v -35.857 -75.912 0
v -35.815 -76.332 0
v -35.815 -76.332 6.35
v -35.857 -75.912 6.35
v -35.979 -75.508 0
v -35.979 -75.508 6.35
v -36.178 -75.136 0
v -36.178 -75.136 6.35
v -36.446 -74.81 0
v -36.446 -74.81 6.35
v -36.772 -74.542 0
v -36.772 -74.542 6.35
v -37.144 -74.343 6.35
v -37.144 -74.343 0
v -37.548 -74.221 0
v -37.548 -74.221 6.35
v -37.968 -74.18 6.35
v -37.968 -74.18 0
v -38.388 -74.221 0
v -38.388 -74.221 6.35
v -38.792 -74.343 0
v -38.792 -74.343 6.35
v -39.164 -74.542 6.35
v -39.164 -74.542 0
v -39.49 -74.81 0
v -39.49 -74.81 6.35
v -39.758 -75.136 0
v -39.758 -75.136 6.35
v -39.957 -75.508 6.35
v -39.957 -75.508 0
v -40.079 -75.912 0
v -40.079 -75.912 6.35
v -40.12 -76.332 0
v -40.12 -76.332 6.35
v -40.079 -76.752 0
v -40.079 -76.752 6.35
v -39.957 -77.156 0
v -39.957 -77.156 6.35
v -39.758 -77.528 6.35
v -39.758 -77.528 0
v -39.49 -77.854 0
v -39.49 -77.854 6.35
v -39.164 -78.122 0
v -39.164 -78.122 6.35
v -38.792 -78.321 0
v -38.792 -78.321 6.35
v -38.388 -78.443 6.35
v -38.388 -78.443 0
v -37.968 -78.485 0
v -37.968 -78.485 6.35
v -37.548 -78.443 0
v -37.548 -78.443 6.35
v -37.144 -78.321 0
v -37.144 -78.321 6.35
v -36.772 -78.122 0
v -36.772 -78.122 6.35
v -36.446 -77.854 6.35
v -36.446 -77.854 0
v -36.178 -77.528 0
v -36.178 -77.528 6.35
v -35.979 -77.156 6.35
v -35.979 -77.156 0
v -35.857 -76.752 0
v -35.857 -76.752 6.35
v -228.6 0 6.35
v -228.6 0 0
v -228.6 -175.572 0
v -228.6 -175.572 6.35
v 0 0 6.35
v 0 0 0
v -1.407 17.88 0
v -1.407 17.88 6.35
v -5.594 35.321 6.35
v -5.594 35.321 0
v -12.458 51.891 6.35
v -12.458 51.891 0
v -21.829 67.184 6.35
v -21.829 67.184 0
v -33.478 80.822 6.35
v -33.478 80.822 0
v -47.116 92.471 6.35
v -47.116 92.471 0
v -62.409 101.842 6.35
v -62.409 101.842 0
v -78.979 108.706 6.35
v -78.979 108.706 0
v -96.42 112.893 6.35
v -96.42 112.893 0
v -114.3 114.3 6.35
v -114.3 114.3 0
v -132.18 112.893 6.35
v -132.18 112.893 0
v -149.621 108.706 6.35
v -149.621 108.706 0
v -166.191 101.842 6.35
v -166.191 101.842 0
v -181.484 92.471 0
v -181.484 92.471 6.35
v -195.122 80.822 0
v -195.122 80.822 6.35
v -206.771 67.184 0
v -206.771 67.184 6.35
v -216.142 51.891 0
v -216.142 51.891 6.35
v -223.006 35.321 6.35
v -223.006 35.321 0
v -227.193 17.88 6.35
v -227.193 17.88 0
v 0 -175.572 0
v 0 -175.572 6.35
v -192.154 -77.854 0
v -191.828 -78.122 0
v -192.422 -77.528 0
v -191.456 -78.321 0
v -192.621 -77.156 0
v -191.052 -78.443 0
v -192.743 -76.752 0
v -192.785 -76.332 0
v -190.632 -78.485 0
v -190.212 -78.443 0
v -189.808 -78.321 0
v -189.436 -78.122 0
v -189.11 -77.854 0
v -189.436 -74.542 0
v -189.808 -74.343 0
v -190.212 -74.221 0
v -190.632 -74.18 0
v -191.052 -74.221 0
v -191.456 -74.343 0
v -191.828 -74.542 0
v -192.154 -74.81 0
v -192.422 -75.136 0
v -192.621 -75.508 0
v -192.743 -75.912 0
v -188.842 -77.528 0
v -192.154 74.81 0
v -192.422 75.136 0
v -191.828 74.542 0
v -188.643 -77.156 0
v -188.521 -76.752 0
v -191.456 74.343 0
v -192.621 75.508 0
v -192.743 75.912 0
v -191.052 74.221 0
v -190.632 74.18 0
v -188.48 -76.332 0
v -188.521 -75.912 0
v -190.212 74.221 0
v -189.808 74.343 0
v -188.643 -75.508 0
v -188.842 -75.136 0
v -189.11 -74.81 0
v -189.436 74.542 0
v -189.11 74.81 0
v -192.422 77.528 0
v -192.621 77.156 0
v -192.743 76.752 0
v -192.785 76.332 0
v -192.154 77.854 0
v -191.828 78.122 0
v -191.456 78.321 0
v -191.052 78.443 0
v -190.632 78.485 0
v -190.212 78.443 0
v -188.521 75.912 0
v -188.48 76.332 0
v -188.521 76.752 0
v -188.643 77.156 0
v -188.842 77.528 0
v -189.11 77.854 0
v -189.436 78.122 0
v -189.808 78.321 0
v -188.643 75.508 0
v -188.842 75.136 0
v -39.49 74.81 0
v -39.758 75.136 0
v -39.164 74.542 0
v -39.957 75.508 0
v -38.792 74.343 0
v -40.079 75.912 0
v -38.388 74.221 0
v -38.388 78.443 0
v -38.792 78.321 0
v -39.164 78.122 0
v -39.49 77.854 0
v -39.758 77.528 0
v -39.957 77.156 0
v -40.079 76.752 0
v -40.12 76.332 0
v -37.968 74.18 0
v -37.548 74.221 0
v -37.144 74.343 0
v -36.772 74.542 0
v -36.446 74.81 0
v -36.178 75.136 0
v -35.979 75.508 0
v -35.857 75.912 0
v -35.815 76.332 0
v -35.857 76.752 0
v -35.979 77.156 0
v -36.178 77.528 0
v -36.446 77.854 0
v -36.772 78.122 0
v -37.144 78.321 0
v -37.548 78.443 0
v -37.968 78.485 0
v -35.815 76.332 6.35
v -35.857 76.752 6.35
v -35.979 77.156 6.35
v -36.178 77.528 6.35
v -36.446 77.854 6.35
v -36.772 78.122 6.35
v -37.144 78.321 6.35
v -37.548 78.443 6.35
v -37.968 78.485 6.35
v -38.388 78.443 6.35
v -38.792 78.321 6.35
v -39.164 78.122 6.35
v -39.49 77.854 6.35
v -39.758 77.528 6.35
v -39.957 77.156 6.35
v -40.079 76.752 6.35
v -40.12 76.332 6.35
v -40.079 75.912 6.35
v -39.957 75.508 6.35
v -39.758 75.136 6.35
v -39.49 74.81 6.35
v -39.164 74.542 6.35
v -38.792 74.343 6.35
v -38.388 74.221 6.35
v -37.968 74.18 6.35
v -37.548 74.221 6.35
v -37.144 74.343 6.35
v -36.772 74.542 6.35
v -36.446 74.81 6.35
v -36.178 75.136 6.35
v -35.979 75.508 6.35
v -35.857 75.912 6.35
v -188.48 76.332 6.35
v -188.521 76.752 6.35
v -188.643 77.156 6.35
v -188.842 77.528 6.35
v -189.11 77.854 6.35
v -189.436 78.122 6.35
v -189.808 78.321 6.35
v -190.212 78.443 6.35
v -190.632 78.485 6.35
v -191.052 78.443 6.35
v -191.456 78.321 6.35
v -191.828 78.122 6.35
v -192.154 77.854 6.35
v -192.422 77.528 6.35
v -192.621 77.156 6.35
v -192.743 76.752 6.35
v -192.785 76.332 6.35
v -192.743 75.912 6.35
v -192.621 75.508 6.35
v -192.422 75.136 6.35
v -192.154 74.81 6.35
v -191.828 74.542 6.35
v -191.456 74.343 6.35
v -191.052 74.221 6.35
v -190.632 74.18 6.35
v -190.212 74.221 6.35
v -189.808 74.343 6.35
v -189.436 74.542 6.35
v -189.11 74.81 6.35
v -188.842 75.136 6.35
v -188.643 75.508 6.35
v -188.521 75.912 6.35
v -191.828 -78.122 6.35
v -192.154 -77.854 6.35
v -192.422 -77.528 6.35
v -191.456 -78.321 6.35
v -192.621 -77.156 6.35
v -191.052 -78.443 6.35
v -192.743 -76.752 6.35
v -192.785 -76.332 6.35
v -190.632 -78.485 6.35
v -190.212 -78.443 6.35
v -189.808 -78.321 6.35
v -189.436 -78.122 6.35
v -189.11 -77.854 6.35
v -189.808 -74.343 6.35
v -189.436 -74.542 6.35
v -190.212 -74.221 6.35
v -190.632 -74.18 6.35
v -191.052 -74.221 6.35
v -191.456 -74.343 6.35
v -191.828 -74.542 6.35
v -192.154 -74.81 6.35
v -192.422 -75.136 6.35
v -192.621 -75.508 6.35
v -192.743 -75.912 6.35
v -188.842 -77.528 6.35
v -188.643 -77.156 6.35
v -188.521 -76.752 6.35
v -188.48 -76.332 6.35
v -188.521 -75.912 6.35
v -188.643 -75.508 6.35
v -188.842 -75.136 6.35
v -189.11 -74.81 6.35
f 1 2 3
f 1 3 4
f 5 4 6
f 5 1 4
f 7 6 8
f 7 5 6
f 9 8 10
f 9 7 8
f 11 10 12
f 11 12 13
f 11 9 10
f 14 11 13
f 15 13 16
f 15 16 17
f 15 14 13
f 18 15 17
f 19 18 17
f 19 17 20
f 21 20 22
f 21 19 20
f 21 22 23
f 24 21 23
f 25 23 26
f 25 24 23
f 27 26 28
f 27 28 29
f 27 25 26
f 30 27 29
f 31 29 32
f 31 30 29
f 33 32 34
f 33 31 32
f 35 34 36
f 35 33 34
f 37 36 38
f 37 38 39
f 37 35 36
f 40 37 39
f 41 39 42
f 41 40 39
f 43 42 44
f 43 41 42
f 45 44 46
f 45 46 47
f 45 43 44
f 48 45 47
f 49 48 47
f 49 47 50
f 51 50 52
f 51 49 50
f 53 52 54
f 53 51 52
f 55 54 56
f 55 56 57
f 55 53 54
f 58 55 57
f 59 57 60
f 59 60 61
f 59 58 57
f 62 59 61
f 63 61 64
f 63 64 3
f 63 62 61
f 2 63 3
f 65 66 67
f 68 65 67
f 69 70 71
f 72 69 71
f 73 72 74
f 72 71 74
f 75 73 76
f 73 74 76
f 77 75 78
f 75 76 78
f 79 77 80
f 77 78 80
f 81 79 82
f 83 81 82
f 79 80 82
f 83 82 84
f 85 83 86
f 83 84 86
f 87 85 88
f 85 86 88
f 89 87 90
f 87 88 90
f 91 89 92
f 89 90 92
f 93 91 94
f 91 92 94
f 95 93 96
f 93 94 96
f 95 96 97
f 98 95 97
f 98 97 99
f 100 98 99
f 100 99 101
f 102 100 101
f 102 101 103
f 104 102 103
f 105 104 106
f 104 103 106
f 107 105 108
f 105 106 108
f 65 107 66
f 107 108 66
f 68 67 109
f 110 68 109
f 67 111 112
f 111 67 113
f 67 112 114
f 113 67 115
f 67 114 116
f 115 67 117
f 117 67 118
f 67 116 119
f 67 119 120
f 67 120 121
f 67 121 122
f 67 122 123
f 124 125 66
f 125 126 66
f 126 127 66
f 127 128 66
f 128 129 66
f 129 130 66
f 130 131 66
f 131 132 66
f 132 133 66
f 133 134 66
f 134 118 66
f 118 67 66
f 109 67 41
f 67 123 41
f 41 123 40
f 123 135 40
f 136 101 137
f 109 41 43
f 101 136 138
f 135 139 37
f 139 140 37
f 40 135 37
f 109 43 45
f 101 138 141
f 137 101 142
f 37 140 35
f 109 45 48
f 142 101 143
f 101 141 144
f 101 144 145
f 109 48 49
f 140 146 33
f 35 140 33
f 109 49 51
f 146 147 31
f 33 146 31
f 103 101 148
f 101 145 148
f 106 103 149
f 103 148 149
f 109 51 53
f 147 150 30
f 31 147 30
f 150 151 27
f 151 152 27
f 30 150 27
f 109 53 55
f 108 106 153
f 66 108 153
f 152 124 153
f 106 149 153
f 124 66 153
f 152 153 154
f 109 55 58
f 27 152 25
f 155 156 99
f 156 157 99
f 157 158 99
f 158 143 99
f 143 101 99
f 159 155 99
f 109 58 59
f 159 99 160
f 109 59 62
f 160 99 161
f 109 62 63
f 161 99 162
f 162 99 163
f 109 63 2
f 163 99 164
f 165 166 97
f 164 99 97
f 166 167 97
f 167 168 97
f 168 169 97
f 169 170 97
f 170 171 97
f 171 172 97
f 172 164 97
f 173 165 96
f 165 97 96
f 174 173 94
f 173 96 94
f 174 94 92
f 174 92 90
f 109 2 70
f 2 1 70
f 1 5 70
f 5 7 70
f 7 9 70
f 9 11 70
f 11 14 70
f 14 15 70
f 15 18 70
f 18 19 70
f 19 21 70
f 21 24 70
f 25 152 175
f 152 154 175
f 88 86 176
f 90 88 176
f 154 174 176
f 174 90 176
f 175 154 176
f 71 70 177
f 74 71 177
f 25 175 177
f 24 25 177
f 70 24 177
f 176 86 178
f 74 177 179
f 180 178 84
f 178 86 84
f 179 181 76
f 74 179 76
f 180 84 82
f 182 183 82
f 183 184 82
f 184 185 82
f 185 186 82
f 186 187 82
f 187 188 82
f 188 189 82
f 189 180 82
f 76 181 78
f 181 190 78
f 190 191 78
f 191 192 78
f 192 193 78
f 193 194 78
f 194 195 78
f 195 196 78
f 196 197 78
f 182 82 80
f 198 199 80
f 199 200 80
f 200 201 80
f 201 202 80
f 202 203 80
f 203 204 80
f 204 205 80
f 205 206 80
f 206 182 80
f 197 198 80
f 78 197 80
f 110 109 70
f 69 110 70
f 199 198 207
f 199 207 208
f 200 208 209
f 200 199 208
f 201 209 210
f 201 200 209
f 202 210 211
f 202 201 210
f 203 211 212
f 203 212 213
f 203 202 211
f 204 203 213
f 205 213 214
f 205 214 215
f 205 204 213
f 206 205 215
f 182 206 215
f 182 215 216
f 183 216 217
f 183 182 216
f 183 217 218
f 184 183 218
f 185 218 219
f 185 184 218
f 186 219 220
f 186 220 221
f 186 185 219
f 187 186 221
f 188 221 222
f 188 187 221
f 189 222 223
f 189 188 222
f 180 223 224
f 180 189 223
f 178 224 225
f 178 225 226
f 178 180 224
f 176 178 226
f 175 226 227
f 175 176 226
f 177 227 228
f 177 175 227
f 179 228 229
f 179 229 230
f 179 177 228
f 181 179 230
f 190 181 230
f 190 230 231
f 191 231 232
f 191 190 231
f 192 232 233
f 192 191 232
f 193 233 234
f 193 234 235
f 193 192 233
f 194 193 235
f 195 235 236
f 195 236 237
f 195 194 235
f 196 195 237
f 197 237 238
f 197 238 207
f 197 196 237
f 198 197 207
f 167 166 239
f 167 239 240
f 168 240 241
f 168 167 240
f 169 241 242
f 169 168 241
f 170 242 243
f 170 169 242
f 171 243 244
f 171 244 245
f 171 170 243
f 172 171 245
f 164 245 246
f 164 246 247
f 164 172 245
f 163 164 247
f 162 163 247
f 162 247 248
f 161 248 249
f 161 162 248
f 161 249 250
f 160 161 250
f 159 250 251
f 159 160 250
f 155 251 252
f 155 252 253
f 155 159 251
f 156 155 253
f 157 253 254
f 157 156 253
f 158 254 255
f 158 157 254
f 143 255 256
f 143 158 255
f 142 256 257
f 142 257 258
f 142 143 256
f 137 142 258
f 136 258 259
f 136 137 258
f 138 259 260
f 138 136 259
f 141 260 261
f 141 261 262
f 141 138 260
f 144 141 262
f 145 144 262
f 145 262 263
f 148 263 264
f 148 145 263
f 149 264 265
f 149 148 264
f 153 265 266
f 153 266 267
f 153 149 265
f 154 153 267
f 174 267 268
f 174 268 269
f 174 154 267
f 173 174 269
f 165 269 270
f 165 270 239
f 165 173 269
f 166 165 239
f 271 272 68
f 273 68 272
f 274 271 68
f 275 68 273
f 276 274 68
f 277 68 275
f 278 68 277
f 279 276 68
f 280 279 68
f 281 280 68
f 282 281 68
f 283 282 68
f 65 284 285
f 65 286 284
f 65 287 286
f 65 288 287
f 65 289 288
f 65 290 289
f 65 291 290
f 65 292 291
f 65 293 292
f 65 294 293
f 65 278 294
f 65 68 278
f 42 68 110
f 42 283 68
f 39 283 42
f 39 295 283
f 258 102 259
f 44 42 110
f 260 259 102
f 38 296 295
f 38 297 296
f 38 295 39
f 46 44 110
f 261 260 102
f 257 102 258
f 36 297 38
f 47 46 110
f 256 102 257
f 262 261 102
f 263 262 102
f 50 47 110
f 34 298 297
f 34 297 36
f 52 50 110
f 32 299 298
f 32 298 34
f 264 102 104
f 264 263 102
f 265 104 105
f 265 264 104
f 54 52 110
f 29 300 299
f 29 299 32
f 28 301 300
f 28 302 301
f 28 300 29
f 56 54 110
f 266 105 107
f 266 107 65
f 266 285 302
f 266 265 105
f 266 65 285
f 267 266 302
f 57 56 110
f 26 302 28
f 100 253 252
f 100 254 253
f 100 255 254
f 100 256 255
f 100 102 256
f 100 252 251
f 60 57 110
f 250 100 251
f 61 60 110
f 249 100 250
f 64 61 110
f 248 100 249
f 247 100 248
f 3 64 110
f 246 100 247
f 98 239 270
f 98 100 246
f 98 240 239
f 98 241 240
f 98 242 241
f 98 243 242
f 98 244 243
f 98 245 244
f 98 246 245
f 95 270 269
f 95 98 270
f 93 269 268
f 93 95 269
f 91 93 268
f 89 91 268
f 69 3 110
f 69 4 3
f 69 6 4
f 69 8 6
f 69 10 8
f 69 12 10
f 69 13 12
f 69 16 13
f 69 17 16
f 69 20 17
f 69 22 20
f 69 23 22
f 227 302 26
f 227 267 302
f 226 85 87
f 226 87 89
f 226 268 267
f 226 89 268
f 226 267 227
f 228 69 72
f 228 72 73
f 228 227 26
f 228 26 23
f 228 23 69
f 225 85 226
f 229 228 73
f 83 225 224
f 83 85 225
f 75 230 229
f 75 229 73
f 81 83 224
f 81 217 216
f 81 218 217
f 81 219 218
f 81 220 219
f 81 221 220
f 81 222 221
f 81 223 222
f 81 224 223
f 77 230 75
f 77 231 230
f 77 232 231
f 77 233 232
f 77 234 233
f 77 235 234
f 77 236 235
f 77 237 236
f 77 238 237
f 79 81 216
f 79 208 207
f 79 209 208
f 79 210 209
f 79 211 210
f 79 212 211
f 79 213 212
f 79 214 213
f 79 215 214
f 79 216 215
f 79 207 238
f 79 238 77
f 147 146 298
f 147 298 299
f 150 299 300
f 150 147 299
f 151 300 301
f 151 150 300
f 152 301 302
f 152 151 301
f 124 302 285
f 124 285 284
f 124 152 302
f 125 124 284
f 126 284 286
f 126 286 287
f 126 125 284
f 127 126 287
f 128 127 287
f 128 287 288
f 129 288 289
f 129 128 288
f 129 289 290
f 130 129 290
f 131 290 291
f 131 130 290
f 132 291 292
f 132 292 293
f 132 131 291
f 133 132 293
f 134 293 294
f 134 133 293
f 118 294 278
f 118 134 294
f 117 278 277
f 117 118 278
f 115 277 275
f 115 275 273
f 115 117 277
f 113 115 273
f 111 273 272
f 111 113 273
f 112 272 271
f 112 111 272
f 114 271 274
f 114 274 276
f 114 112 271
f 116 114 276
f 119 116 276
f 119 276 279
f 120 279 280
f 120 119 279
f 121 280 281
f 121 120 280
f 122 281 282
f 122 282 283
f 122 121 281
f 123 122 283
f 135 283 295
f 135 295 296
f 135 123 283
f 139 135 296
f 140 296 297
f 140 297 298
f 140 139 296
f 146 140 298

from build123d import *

# Parameters (mm, degrees)
F0_R     = 2.15265
F1_DEPTH = 6.35


with BuildPart() as f1:
    # F0 (on Top) → F1 (new body)
    with BuildSketch(Plane.XY):
        with BuildLine():
            Line((-228.6, -175.571772), (0, -175.571772))
            Line((0, -175.571772), (0, 0))
            ThreePointArc((0, 0), (-114.3, 114.3), (-228.6, 0))
            Line((-228.6, 0), (-228.6, -175.571772))
        make_face()
        with Locations((-190.632177, -76.332177)):
            Circle(F0_R, mode=Mode.SUBTRACT)
        with Locations((-37.967823, -76.332177)):
            Circle(F0_R, mode=Mode.SUBTRACT)
        with Locations((-190.632177, 76.332177)):
            Circle(F0_R, mode=Mode.SUBTRACT)
        with Locations((-37.967823, 76.332177)):
            Circle(F0_R, mode=Mode.SUBTRACT)
    extrude(amount=F1_DEPTH)


solid = f1.part
